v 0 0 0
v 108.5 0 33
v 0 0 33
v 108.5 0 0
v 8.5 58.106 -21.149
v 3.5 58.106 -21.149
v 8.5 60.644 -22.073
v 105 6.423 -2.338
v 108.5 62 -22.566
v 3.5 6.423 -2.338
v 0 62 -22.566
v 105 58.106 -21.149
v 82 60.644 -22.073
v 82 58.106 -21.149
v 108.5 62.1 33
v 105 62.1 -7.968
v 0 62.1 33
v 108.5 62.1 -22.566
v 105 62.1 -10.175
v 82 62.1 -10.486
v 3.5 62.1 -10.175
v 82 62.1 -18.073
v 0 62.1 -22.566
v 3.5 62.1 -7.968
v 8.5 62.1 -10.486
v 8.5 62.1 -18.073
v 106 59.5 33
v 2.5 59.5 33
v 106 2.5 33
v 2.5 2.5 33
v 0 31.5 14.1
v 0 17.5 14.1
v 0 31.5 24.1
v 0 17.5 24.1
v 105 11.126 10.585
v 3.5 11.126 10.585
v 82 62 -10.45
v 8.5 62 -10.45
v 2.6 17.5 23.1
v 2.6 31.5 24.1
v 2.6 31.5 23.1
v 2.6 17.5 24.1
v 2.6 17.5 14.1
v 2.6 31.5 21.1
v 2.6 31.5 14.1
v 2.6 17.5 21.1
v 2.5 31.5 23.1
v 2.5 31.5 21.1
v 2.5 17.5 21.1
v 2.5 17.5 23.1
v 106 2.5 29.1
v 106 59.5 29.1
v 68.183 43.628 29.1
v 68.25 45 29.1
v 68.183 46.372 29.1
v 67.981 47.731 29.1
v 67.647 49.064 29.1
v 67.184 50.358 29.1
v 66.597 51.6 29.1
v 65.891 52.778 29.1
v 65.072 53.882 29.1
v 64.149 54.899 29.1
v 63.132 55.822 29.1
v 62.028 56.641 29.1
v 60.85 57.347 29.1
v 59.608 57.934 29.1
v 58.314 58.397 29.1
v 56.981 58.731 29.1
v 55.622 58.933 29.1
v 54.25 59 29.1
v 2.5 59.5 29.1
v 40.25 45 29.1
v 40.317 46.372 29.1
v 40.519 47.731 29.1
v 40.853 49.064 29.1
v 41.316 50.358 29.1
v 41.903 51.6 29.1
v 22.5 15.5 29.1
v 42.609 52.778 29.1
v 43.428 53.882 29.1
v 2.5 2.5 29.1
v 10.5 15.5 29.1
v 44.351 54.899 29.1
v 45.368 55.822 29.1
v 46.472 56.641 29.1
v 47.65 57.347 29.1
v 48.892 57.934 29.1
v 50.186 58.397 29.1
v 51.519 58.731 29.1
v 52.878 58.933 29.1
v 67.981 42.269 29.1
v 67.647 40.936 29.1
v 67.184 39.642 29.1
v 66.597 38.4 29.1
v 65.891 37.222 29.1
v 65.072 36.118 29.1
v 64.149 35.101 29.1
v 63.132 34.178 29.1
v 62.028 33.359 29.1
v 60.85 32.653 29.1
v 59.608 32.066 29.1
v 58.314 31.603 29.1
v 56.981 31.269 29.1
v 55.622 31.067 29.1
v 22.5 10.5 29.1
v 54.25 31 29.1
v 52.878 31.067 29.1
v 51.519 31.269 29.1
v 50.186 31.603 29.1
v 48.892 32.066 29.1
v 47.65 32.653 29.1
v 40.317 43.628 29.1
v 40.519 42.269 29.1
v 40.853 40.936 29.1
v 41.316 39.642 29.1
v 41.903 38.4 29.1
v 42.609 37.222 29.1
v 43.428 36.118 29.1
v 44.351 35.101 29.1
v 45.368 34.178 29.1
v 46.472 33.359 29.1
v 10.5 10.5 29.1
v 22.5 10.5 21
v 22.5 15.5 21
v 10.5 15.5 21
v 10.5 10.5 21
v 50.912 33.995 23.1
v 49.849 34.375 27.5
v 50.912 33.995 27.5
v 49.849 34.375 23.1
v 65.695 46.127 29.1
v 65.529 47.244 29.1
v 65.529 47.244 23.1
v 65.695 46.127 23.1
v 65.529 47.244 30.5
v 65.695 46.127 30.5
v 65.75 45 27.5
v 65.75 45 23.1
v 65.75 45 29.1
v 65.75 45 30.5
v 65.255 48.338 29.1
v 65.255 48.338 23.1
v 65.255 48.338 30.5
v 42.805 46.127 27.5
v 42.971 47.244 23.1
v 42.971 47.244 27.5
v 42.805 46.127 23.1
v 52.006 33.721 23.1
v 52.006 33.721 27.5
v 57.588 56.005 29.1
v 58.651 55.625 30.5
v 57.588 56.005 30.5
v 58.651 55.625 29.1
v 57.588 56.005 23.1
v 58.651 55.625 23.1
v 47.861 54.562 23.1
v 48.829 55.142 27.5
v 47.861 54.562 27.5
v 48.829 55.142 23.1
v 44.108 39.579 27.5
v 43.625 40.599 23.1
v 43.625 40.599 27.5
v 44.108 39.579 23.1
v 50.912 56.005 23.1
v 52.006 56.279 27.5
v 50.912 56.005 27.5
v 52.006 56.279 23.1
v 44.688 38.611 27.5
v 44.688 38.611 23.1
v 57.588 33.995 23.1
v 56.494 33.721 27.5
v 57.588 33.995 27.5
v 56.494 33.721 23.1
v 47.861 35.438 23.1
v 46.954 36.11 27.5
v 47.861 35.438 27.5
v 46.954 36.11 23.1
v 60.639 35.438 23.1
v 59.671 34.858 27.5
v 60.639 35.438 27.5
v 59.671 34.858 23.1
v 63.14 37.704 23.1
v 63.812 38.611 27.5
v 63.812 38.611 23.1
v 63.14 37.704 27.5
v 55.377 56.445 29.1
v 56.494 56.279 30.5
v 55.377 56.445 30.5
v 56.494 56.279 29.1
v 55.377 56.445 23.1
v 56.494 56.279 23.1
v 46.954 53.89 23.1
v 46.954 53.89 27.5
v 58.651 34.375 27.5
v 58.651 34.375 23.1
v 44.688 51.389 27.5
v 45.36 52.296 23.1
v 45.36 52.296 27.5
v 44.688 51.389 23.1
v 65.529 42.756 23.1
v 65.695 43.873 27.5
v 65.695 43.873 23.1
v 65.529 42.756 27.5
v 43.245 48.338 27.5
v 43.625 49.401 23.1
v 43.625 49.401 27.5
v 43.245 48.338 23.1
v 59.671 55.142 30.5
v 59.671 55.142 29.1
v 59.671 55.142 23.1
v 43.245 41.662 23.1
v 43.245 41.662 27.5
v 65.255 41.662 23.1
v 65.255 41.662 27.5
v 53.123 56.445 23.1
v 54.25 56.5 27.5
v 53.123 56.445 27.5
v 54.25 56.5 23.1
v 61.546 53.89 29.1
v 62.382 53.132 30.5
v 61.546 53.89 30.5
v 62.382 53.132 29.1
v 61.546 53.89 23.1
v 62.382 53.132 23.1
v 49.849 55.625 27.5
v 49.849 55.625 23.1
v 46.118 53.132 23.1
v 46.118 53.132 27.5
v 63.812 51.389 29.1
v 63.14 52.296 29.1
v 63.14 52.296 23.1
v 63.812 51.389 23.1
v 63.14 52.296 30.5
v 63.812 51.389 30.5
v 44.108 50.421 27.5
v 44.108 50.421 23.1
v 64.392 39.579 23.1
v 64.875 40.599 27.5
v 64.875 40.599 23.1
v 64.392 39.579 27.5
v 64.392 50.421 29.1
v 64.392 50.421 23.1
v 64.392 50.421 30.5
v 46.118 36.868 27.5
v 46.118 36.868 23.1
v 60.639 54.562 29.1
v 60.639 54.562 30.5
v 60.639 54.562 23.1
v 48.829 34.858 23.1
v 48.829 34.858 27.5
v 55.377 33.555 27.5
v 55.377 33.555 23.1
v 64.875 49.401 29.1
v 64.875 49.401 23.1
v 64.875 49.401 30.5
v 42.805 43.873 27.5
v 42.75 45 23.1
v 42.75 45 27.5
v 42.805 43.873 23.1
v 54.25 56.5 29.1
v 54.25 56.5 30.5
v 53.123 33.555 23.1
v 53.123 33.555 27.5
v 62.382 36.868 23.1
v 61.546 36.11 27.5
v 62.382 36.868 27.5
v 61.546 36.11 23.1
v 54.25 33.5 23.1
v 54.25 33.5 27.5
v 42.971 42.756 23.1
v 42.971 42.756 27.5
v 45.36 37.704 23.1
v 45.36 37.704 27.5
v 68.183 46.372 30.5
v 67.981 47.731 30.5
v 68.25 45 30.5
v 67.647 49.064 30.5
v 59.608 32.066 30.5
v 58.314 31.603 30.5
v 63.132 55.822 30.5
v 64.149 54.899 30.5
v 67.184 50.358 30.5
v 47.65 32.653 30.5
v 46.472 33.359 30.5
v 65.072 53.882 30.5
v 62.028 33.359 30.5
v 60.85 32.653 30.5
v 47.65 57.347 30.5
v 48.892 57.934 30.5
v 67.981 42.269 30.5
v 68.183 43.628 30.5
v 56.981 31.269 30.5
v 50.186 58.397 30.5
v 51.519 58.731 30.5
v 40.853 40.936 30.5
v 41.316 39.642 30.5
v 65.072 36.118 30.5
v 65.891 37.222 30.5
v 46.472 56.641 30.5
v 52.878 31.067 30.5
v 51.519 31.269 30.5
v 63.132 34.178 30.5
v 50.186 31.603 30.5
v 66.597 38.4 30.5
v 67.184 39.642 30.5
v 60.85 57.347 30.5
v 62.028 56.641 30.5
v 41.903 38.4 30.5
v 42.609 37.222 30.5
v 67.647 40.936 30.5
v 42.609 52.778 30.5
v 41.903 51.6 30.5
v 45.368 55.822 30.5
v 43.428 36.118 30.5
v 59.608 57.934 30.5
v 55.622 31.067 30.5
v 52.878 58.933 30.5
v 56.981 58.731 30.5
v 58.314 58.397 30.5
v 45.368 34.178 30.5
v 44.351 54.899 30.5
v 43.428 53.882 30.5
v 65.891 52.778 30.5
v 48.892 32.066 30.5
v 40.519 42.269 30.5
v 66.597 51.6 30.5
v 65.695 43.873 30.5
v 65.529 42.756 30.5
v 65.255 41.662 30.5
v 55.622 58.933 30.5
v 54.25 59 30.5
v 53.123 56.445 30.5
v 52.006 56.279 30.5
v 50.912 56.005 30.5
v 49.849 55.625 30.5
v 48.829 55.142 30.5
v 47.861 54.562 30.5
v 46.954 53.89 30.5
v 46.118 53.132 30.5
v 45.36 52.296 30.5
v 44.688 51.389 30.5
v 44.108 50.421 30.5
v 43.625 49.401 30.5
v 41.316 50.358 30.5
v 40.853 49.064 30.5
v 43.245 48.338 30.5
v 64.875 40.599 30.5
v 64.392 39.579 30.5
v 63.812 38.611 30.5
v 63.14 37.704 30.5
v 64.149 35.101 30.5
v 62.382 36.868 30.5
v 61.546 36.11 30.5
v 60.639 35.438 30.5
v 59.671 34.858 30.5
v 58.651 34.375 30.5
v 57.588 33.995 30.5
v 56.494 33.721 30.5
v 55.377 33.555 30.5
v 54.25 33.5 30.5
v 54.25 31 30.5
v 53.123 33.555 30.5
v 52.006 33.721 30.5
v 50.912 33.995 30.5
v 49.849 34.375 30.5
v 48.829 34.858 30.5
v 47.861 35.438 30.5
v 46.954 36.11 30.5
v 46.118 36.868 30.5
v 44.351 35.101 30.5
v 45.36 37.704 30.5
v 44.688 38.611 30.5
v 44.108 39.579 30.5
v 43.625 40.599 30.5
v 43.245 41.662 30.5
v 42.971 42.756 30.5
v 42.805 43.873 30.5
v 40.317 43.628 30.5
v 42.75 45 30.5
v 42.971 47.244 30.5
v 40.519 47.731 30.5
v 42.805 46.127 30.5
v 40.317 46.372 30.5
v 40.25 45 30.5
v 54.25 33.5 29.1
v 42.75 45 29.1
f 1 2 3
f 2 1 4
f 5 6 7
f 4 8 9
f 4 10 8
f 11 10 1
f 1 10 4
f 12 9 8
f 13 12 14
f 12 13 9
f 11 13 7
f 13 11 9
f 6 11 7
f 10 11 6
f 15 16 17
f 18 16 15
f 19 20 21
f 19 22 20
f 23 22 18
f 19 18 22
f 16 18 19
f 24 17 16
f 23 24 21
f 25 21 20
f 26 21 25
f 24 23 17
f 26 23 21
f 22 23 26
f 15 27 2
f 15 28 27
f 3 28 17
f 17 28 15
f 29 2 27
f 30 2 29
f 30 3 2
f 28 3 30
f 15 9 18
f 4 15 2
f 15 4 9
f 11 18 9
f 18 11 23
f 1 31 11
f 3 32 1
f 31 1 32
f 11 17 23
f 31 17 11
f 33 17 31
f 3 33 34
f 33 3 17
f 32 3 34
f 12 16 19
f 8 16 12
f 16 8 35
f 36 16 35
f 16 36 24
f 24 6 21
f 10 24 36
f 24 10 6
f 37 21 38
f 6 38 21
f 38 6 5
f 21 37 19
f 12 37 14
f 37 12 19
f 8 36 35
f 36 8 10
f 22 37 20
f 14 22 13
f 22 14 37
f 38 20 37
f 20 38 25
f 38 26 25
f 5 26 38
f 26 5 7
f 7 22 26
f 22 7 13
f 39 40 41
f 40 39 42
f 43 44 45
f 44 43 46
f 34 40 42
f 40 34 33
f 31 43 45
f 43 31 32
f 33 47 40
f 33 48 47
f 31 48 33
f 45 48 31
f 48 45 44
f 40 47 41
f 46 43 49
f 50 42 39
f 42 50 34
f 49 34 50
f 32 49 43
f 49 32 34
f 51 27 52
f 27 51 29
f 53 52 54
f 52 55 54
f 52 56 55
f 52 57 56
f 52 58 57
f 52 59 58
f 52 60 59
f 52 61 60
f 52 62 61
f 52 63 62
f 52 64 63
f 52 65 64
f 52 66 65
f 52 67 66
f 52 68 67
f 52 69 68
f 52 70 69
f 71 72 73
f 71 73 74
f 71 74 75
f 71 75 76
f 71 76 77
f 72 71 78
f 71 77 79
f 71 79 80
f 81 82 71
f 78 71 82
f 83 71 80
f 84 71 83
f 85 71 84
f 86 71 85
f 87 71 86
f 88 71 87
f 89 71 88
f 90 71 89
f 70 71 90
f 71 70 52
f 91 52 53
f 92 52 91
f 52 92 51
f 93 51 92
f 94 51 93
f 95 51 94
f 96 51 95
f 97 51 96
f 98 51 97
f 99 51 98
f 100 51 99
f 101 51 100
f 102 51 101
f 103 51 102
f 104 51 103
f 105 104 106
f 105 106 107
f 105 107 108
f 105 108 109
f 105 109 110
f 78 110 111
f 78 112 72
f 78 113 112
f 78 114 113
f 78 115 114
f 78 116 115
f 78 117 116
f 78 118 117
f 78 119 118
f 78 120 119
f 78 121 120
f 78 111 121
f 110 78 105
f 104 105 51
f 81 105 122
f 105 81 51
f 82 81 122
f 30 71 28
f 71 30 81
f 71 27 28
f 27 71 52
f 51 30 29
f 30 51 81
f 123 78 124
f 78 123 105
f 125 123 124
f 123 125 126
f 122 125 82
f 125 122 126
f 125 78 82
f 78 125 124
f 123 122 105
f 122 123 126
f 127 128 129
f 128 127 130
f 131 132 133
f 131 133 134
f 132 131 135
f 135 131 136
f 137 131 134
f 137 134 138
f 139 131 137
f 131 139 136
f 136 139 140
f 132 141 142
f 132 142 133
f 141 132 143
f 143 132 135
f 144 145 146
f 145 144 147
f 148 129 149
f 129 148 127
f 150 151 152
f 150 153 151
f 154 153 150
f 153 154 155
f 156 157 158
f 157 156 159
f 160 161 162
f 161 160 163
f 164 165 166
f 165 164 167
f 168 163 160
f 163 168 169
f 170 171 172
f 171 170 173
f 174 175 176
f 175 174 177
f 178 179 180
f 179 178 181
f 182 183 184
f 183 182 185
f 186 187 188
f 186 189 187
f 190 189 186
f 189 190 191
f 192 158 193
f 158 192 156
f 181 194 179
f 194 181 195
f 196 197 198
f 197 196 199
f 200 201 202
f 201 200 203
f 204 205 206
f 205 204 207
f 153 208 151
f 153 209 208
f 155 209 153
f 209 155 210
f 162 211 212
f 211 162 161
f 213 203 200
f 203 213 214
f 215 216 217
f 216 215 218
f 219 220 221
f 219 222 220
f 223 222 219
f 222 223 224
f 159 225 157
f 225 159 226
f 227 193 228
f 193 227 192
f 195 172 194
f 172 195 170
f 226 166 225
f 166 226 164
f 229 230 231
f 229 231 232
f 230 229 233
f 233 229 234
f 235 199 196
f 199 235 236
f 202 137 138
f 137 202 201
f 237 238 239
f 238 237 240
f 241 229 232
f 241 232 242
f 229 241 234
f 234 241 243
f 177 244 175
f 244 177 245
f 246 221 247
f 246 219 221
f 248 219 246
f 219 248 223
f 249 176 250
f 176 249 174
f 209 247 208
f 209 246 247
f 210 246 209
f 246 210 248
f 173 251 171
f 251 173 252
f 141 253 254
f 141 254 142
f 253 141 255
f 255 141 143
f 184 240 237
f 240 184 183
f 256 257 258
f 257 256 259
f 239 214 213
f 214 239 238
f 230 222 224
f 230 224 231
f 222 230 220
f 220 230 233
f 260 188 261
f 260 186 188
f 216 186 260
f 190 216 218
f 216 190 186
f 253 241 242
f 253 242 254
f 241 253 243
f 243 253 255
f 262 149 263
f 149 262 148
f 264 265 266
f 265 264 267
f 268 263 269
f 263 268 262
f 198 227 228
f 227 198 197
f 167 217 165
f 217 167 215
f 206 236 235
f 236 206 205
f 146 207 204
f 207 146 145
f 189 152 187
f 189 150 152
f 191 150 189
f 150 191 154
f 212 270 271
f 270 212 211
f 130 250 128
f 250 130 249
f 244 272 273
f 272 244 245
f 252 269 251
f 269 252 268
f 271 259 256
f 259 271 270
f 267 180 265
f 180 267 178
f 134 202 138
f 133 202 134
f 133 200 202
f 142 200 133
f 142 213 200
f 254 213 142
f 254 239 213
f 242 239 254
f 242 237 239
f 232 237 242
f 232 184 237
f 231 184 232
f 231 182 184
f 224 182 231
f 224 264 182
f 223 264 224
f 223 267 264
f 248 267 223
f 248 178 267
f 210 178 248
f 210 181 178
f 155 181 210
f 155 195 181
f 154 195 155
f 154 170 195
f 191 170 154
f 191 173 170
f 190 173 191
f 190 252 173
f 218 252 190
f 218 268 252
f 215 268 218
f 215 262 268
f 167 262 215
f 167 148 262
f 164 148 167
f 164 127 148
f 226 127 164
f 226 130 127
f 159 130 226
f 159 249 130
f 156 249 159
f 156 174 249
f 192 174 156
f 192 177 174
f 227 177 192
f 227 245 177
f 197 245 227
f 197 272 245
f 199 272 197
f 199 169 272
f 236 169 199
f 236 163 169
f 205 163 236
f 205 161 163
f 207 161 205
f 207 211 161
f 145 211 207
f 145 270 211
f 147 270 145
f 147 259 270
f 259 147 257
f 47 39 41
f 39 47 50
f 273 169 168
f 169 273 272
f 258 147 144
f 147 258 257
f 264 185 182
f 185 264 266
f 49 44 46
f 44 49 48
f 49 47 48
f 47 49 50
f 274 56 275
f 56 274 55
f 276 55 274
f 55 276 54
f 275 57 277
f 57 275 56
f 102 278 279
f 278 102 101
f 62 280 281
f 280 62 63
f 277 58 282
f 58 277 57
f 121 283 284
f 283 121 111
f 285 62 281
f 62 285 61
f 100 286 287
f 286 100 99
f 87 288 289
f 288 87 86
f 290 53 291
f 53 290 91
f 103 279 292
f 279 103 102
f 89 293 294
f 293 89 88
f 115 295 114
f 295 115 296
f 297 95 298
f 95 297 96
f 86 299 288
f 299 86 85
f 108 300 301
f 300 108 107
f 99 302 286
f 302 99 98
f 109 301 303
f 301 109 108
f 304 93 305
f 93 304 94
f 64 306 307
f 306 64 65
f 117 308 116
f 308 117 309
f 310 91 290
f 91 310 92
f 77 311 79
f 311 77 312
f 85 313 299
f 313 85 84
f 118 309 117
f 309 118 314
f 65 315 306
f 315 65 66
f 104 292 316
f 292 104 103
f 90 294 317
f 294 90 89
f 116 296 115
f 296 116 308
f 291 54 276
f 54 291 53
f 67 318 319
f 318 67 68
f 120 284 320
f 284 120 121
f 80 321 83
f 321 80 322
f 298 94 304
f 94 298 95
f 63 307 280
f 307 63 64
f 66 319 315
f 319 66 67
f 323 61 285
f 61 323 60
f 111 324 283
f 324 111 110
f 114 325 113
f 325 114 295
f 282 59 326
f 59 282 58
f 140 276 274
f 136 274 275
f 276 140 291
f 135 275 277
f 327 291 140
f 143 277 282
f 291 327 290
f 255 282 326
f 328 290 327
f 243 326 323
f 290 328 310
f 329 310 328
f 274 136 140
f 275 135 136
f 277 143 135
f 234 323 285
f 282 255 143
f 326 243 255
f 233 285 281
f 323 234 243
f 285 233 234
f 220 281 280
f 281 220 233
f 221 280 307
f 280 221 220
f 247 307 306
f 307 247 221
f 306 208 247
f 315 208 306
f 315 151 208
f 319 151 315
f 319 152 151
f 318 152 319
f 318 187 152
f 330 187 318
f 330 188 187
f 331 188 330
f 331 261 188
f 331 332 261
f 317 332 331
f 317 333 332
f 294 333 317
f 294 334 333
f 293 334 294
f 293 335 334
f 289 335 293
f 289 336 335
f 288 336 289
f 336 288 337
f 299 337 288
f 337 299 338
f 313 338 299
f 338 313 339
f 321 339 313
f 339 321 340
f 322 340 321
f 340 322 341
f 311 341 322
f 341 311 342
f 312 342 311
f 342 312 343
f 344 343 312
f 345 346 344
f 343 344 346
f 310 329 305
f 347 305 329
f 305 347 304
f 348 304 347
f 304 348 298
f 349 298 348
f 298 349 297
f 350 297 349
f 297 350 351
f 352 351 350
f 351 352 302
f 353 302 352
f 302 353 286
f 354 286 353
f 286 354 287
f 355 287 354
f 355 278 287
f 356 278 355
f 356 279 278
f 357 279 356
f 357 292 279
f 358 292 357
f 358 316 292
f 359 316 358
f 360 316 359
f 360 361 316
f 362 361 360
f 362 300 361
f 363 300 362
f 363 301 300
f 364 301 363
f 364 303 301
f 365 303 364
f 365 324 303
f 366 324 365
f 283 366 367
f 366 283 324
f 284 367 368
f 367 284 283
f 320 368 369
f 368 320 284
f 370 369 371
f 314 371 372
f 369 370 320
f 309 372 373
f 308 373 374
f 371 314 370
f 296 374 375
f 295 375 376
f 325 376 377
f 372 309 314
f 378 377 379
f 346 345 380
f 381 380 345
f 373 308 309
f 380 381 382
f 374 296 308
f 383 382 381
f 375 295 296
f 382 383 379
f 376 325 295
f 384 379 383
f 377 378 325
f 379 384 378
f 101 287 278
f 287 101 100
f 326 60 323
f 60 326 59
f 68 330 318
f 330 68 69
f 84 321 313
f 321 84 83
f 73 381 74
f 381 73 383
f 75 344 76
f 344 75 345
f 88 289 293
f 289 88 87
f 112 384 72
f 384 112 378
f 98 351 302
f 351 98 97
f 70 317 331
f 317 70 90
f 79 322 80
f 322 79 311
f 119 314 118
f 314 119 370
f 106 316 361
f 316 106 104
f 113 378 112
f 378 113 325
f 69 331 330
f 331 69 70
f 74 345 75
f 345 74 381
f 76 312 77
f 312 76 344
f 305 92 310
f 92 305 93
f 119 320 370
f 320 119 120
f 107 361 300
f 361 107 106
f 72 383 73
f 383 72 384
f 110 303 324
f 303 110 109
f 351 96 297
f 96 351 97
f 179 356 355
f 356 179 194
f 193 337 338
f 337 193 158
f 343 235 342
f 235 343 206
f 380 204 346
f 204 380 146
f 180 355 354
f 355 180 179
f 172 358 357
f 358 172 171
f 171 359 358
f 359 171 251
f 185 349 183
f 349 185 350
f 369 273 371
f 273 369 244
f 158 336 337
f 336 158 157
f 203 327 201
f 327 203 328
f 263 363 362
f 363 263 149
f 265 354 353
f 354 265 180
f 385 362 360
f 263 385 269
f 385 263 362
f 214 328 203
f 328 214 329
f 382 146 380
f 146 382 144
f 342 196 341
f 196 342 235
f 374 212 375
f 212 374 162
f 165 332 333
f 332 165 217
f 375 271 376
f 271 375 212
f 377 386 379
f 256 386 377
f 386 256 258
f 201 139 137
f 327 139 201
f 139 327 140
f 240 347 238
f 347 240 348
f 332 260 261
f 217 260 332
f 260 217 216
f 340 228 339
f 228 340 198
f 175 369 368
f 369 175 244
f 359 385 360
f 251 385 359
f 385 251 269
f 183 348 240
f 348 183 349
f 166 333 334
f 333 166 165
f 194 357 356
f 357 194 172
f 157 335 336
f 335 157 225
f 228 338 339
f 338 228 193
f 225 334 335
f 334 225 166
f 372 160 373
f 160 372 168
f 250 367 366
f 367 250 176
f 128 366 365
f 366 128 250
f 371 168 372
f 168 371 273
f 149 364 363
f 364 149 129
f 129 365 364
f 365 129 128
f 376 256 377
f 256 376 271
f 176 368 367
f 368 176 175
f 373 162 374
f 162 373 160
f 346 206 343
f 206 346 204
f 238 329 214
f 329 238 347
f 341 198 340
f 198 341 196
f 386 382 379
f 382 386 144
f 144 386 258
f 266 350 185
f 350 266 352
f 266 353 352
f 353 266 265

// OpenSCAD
// CYD 3.5" Display + Relay Enclosure for Crockpot
// Angled display with overhang, flat back
//
// SIDE VIEW:
//
//         ╱────│
//        ╱     │  <- display at 20° angle
//       ╱      │
//      ╱───────┤  <- barrier + signal slot
//     │ ░░░░░░ │  <- relay section (uniform depth)
//     │  SSR   │
//     │  PSU   │
//     └────────┘
//         ╔═╗
//         ║ ║  <- switch cylinder slides in
//     ════╩═╩════ crockpot
//

/* [Crockpot Switch Cylinder] */
switch_cylinder_od = 22;     // mm - measure this
switch_cylinder_height = 12; // mm
socket_clearance = 0.5;      // mm

/* [CYD 3.5" Display - ESP32-3248S035C actual dimensions] */
cyd_width = 101.5;           // mm - PCB width
cyd_height = 55;             // mm - PCB height
cyd_pcb_thickness = 1.6;     // mm - PCB thickness
cyd_component_height = 10;   // mm - components on back (ESP32 module, etc)
cyd_depth = cyd_pcb_thickness + cyd_component_height;  // total depth
cyd_screen_width = 73.5;     // mm - active display area
cyd_screen_height = 49;      // mm - active display area
cyd_screen_offset_x = 5;     // mm - screen offset from left edge
cyd_screen_offset_y = 3;     // mm - screen offset from bottom edge
cyd_bezel_thickness = 4;     // mm - display bezel/glass on front
// Mounting holes (estimated - 4 corners)
cyd_hole_dia = 3;            // mm - M3 mounting holes
cyd_hole_inset = 3;          // mm - distance from edge to hole center

/* [Display Angle] */
display_angle = 20;          // degrees - tilt toward user

/* [Relay Section] */
// Tall components (SSR ~20mm, HLK-PM01 ~20mm) go at BOTTOM (low Y)
max_component_height = 22;   // mm - tallest component (HLK-PM01 or SSR)
relay_depth = 20;            // mm - reduced depth for relay section

/* [Isolation] */
isolation_gap = 6;           // mm
barrier_thickness = 2;       // mm
signal_slot_width = 12;      // mm
signal_slot_height = 5;      // mm

/* [Enclosure] */
wall_thickness = 2.5;        // mm

// Derived dimensions
enclosure_width = cyd_width + wall_thickness * 2 + 2;
enclosure_height = cyd_height + wall_thickness * 2 + 2;
socket_id = switch_cylinder_od + socket_clearance * 2;

// Overhang calculated from angle so front face and display are PARALLEL
display_overhang = enclosure_height * tan(display_angle);

// Calculate geometry - display depth is part of the angled section, not added to back
back_depth = relay_depth + wall_thickness + isolation_gap + barrier_thickness;

$fn = 64;

module assembly() {
    color("DarkSlateGray") enclosure_body();

    barrier_z = cyd_depth + cyd_bezel_thickness + wall_thickness + 3;

    // CYD dummy (angled - bottom near barrier, top forward)
    %translate([wall_thickness + 1, enclosure_height - wall_thickness - 1, -display_overhang + wall_thickness])
        rotate([-display_angle, 0, 0])
            translate([0, -cyd_height, 0])
                cyd_dummy();

    // Relay components in relay section at TOP (high Y - near socket)
    %translate([wall_thickness + 5, enclosure_height - wall_thickness - 25, barrier_z + barrier_thickness + isolation_gap + 2])
        relay_components_dummy();

    // Switch cylinder dummy at TOP (high Y - slides in from crockpot)
    %translate([enclosure_width/2, enclosure_height - wall_thickness - socket_id/2 - 3, back_depth + 2])
        color("Brown", 0.3)
            cylinder(d=switch_cylinder_od, h=switch_cylinder_height);
}

module enclosure_body() {
    // front_bottom_z = 0 (reference point)
    // front_top_z = -display_overhang (overhangs forward)
    // back is at uniform depth: back_depth

    difference() {
        // Main body with angled front, flat back
        hull() {
            // Front bottom edge (at z=0)
            translate([0, 0, 0])
                cube([enclosure_width, 0.1, wall_thickness]);

            // Front top edge (overhangs forward, negative z)
            translate([0, enclosure_height, -display_overhang])
                cube([enclosure_width, 0.1, wall_thickness]);

            // Back bottom edge
            translate([0, 0, back_depth])
                cube([enclosure_width, 0.1, wall_thickness]);

            // Back top edge (same depth - flat back)
            translate([0, enclosure_height, back_depth])
                cube([enclosure_width, 0.1, wall_thickness]);
        }

        // ========== DISPLAY POCKET (angled) ==========

        // Display bottom is near barrier, top overhangs forward
        // Pocket includes space for bezel in front and components behind
        translate([wall_thickness + 1, enclosure_height - wall_thickness - 1, -display_overhang + wall_thickness])
            rotate([-display_angle, 0, 0])
                translate([0, -cyd_height, -cyd_bezel_thickness - 1])
                    cube([cyd_width, cyd_height, cyd_depth + cyd_bezel_thickness + 2]);

        // Screen cutout (angled, through front face)
        translate([
            wall_thickness + 1 + cyd_screen_offset_x,
            enclosure_height - wall_thickness - 1 - cyd_height + cyd_screen_offset_y,
            -display_overhang - 5
        ])
            rotate([-display_angle, 0, 0])
                translate([0, 0, 0])
                    cube([cyd_screen_width, cyd_screen_height, wall_thickness + display_overhang + 10]);

        // USB access (left side, near bottom of display which is now at back)
        translate([-0.1, wall_thickness + 15, wall_thickness + cyd_depth])
            cube([wall_thickness + 0.2, 14, 10]);

        // ========== RELAY CAVITY (uniform depth) ==========

        barrier_z = cyd_depth + cyd_bezel_thickness + wall_thickness + 3;  // after display section

        translate([wall_thickness, wall_thickness, barrier_z + barrier_thickness + isolation_gap])
            cube([
                enclosure_width - wall_thickness * 2,
                enclosure_height - wall_thickness * 2,
                relay_depth
            ]);

        // ========== SIGNAL SLOT ==========

        // At BOTTOM of barrier (low Y - away from mains at top)
        translate([
            wall_thickness + 8,
            wall_thickness + 8,
            barrier_z - 0.1
        ])
            cube([signal_slot_width, signal_slot_height, barrier_thickness + isolation_gap + 0.2]);

        // ========== SOCKET FOR SWITCH CYLINDER ==========

        // Open hole at back, at TOP (high Y - where mains/high power is)
        translate([enclosure_width/2, enclosure_height - wall_thickness - socket_id/2 - 3, barrier_z + barrier_thickness])
            cylinder(d=socket_id, h=back_depth);
    }

    // Isolation barrier (solid floor between display and relay)
    barrier_z = cyd_depth + cyd_bezel_thickness + wall_thickness + 3;
    difference() {
        translate([wall_thickness, wall_thickness, barrier_z])
            cube([enclosure_width - wall_thickness*2, enclosure_height - wall_thickness*2, barrier_thickness]);

        // Signal slot through barrier (at BOTTOM, low Y)
        translate([
            wall_thickness + 8,
            wall_thickness + 8,
            barrier_z - 0.1
        ])
            cube([signal_slot_width, signal_slot_height, barrier_thickness + 0.2]);
    }

    // Socket rim at TOP (high Y - where mains is)
    translate([enclosure_width/2, enclosure_height - wall_thickness - socket_id/2 - 3, back_depth - 3])
        difference() {
            cylinder(d=socket_id + 5, h=3);
            translate([0, 0, -0.1])
                cylinder(d=socket_id, h=3.2);
        }
}

module cyd_dummy() {
    // Detailed ESP32-3248S035C model

    // PCB (yellow, characteristic of CYD)
    color("Gold", 0.8)
        difference() {
            cube([cyd_width, cyd_height, cyd_pcb_thickness]);
            // Mounting holes
            for (x = [cyd_hole_inset, cyd_width - cyd_hole_inset]) {
                for (y = [cyd_hole_inset, cyd_height - cyd_hole_inset]) {
                    translate([x, y, -0.1])
                        cylinder(d=cyd_hole_dia, h=cyd_pcb_thickness + 0.2, $fn=16);
                }
            }
        }

    // Display bezel/glass (front, raised)
    color("DimGray", 0.9)
        translate([2, 1, -cyd_bezel_thickness])
            cube([cyd_width - 4, cyd_height - 2, cyd_bezel_thickness]);

    // Active display area (black screen)
    color("Black", 0.95)
        translate([cyd_screen_offset_x, cyd_screen_offset_y, -cyd_bezel_thickness - 0.1])
            cube([cyd_screen_width, cyd_screen_height, 0.2]);

    // Components on back of PCB
    // ESP32-WROOM module
    color("DarkGray", 0.7)
        translate([cyd_width - 30, 10, cyd_pcb_thickness])
            cube([25, 18, 3]);

    // SD card slot
    color("Silver", 0.8)
        translate([5, cyd_height - 15, cyd_pcb_thickness])
            cube([15, 14, 2]);

    // USB Micro connector (left side)
    color("Silver", 0.8)
        translate([-2, 20, cyd_pcb_thickness])
            cube([7, 8, 3]);

    // Misc components (capacitors, etc)
    color("DarkSlateGray", 0.6)
        translate([40, 25, cyd_pcb_thickness])
            cube([20, 15, 2]);
}

module relay_components_dummy() {
    // Components laid out to fit in bottom of wedge
    // SSR (small PCB mount, ~20mm tall when vertical)
    color("Navy", 0.5) cube([20, 20, 8]);

    // HLK-PM01 (~20mm tall)
    translate([25, 0, 0])
        color("DarkGreen", 0.5) cube([34, 20, 15]);
}

assembly();

// ============================================================
// DIMENSIONS
// ============================================================
//
// Width:  ~106 mm
// Height: ~66 mm
// Depth (back): ~41 mm (uniform, flat back)
// Display overhang: 15 mm forward at top
//
// Adjust display_angle (15-25°) for viewing angle
// Adjust display_overhang to extend/shorten the angled face
// Adjust relay_depth if you need more/less room for components
//
// ============================================================
// LAYOUT
// ============================================================
//
// FRONT: Angled display (CYD 3.5")
// BARRIER: Isolation wall + signal slot (low voltage only)
// BACK: Relay section - SSR, HLK-PM01, wiring
// SOCKET: Switch cylinder from crockpot slides into back
//
// ============================================================
